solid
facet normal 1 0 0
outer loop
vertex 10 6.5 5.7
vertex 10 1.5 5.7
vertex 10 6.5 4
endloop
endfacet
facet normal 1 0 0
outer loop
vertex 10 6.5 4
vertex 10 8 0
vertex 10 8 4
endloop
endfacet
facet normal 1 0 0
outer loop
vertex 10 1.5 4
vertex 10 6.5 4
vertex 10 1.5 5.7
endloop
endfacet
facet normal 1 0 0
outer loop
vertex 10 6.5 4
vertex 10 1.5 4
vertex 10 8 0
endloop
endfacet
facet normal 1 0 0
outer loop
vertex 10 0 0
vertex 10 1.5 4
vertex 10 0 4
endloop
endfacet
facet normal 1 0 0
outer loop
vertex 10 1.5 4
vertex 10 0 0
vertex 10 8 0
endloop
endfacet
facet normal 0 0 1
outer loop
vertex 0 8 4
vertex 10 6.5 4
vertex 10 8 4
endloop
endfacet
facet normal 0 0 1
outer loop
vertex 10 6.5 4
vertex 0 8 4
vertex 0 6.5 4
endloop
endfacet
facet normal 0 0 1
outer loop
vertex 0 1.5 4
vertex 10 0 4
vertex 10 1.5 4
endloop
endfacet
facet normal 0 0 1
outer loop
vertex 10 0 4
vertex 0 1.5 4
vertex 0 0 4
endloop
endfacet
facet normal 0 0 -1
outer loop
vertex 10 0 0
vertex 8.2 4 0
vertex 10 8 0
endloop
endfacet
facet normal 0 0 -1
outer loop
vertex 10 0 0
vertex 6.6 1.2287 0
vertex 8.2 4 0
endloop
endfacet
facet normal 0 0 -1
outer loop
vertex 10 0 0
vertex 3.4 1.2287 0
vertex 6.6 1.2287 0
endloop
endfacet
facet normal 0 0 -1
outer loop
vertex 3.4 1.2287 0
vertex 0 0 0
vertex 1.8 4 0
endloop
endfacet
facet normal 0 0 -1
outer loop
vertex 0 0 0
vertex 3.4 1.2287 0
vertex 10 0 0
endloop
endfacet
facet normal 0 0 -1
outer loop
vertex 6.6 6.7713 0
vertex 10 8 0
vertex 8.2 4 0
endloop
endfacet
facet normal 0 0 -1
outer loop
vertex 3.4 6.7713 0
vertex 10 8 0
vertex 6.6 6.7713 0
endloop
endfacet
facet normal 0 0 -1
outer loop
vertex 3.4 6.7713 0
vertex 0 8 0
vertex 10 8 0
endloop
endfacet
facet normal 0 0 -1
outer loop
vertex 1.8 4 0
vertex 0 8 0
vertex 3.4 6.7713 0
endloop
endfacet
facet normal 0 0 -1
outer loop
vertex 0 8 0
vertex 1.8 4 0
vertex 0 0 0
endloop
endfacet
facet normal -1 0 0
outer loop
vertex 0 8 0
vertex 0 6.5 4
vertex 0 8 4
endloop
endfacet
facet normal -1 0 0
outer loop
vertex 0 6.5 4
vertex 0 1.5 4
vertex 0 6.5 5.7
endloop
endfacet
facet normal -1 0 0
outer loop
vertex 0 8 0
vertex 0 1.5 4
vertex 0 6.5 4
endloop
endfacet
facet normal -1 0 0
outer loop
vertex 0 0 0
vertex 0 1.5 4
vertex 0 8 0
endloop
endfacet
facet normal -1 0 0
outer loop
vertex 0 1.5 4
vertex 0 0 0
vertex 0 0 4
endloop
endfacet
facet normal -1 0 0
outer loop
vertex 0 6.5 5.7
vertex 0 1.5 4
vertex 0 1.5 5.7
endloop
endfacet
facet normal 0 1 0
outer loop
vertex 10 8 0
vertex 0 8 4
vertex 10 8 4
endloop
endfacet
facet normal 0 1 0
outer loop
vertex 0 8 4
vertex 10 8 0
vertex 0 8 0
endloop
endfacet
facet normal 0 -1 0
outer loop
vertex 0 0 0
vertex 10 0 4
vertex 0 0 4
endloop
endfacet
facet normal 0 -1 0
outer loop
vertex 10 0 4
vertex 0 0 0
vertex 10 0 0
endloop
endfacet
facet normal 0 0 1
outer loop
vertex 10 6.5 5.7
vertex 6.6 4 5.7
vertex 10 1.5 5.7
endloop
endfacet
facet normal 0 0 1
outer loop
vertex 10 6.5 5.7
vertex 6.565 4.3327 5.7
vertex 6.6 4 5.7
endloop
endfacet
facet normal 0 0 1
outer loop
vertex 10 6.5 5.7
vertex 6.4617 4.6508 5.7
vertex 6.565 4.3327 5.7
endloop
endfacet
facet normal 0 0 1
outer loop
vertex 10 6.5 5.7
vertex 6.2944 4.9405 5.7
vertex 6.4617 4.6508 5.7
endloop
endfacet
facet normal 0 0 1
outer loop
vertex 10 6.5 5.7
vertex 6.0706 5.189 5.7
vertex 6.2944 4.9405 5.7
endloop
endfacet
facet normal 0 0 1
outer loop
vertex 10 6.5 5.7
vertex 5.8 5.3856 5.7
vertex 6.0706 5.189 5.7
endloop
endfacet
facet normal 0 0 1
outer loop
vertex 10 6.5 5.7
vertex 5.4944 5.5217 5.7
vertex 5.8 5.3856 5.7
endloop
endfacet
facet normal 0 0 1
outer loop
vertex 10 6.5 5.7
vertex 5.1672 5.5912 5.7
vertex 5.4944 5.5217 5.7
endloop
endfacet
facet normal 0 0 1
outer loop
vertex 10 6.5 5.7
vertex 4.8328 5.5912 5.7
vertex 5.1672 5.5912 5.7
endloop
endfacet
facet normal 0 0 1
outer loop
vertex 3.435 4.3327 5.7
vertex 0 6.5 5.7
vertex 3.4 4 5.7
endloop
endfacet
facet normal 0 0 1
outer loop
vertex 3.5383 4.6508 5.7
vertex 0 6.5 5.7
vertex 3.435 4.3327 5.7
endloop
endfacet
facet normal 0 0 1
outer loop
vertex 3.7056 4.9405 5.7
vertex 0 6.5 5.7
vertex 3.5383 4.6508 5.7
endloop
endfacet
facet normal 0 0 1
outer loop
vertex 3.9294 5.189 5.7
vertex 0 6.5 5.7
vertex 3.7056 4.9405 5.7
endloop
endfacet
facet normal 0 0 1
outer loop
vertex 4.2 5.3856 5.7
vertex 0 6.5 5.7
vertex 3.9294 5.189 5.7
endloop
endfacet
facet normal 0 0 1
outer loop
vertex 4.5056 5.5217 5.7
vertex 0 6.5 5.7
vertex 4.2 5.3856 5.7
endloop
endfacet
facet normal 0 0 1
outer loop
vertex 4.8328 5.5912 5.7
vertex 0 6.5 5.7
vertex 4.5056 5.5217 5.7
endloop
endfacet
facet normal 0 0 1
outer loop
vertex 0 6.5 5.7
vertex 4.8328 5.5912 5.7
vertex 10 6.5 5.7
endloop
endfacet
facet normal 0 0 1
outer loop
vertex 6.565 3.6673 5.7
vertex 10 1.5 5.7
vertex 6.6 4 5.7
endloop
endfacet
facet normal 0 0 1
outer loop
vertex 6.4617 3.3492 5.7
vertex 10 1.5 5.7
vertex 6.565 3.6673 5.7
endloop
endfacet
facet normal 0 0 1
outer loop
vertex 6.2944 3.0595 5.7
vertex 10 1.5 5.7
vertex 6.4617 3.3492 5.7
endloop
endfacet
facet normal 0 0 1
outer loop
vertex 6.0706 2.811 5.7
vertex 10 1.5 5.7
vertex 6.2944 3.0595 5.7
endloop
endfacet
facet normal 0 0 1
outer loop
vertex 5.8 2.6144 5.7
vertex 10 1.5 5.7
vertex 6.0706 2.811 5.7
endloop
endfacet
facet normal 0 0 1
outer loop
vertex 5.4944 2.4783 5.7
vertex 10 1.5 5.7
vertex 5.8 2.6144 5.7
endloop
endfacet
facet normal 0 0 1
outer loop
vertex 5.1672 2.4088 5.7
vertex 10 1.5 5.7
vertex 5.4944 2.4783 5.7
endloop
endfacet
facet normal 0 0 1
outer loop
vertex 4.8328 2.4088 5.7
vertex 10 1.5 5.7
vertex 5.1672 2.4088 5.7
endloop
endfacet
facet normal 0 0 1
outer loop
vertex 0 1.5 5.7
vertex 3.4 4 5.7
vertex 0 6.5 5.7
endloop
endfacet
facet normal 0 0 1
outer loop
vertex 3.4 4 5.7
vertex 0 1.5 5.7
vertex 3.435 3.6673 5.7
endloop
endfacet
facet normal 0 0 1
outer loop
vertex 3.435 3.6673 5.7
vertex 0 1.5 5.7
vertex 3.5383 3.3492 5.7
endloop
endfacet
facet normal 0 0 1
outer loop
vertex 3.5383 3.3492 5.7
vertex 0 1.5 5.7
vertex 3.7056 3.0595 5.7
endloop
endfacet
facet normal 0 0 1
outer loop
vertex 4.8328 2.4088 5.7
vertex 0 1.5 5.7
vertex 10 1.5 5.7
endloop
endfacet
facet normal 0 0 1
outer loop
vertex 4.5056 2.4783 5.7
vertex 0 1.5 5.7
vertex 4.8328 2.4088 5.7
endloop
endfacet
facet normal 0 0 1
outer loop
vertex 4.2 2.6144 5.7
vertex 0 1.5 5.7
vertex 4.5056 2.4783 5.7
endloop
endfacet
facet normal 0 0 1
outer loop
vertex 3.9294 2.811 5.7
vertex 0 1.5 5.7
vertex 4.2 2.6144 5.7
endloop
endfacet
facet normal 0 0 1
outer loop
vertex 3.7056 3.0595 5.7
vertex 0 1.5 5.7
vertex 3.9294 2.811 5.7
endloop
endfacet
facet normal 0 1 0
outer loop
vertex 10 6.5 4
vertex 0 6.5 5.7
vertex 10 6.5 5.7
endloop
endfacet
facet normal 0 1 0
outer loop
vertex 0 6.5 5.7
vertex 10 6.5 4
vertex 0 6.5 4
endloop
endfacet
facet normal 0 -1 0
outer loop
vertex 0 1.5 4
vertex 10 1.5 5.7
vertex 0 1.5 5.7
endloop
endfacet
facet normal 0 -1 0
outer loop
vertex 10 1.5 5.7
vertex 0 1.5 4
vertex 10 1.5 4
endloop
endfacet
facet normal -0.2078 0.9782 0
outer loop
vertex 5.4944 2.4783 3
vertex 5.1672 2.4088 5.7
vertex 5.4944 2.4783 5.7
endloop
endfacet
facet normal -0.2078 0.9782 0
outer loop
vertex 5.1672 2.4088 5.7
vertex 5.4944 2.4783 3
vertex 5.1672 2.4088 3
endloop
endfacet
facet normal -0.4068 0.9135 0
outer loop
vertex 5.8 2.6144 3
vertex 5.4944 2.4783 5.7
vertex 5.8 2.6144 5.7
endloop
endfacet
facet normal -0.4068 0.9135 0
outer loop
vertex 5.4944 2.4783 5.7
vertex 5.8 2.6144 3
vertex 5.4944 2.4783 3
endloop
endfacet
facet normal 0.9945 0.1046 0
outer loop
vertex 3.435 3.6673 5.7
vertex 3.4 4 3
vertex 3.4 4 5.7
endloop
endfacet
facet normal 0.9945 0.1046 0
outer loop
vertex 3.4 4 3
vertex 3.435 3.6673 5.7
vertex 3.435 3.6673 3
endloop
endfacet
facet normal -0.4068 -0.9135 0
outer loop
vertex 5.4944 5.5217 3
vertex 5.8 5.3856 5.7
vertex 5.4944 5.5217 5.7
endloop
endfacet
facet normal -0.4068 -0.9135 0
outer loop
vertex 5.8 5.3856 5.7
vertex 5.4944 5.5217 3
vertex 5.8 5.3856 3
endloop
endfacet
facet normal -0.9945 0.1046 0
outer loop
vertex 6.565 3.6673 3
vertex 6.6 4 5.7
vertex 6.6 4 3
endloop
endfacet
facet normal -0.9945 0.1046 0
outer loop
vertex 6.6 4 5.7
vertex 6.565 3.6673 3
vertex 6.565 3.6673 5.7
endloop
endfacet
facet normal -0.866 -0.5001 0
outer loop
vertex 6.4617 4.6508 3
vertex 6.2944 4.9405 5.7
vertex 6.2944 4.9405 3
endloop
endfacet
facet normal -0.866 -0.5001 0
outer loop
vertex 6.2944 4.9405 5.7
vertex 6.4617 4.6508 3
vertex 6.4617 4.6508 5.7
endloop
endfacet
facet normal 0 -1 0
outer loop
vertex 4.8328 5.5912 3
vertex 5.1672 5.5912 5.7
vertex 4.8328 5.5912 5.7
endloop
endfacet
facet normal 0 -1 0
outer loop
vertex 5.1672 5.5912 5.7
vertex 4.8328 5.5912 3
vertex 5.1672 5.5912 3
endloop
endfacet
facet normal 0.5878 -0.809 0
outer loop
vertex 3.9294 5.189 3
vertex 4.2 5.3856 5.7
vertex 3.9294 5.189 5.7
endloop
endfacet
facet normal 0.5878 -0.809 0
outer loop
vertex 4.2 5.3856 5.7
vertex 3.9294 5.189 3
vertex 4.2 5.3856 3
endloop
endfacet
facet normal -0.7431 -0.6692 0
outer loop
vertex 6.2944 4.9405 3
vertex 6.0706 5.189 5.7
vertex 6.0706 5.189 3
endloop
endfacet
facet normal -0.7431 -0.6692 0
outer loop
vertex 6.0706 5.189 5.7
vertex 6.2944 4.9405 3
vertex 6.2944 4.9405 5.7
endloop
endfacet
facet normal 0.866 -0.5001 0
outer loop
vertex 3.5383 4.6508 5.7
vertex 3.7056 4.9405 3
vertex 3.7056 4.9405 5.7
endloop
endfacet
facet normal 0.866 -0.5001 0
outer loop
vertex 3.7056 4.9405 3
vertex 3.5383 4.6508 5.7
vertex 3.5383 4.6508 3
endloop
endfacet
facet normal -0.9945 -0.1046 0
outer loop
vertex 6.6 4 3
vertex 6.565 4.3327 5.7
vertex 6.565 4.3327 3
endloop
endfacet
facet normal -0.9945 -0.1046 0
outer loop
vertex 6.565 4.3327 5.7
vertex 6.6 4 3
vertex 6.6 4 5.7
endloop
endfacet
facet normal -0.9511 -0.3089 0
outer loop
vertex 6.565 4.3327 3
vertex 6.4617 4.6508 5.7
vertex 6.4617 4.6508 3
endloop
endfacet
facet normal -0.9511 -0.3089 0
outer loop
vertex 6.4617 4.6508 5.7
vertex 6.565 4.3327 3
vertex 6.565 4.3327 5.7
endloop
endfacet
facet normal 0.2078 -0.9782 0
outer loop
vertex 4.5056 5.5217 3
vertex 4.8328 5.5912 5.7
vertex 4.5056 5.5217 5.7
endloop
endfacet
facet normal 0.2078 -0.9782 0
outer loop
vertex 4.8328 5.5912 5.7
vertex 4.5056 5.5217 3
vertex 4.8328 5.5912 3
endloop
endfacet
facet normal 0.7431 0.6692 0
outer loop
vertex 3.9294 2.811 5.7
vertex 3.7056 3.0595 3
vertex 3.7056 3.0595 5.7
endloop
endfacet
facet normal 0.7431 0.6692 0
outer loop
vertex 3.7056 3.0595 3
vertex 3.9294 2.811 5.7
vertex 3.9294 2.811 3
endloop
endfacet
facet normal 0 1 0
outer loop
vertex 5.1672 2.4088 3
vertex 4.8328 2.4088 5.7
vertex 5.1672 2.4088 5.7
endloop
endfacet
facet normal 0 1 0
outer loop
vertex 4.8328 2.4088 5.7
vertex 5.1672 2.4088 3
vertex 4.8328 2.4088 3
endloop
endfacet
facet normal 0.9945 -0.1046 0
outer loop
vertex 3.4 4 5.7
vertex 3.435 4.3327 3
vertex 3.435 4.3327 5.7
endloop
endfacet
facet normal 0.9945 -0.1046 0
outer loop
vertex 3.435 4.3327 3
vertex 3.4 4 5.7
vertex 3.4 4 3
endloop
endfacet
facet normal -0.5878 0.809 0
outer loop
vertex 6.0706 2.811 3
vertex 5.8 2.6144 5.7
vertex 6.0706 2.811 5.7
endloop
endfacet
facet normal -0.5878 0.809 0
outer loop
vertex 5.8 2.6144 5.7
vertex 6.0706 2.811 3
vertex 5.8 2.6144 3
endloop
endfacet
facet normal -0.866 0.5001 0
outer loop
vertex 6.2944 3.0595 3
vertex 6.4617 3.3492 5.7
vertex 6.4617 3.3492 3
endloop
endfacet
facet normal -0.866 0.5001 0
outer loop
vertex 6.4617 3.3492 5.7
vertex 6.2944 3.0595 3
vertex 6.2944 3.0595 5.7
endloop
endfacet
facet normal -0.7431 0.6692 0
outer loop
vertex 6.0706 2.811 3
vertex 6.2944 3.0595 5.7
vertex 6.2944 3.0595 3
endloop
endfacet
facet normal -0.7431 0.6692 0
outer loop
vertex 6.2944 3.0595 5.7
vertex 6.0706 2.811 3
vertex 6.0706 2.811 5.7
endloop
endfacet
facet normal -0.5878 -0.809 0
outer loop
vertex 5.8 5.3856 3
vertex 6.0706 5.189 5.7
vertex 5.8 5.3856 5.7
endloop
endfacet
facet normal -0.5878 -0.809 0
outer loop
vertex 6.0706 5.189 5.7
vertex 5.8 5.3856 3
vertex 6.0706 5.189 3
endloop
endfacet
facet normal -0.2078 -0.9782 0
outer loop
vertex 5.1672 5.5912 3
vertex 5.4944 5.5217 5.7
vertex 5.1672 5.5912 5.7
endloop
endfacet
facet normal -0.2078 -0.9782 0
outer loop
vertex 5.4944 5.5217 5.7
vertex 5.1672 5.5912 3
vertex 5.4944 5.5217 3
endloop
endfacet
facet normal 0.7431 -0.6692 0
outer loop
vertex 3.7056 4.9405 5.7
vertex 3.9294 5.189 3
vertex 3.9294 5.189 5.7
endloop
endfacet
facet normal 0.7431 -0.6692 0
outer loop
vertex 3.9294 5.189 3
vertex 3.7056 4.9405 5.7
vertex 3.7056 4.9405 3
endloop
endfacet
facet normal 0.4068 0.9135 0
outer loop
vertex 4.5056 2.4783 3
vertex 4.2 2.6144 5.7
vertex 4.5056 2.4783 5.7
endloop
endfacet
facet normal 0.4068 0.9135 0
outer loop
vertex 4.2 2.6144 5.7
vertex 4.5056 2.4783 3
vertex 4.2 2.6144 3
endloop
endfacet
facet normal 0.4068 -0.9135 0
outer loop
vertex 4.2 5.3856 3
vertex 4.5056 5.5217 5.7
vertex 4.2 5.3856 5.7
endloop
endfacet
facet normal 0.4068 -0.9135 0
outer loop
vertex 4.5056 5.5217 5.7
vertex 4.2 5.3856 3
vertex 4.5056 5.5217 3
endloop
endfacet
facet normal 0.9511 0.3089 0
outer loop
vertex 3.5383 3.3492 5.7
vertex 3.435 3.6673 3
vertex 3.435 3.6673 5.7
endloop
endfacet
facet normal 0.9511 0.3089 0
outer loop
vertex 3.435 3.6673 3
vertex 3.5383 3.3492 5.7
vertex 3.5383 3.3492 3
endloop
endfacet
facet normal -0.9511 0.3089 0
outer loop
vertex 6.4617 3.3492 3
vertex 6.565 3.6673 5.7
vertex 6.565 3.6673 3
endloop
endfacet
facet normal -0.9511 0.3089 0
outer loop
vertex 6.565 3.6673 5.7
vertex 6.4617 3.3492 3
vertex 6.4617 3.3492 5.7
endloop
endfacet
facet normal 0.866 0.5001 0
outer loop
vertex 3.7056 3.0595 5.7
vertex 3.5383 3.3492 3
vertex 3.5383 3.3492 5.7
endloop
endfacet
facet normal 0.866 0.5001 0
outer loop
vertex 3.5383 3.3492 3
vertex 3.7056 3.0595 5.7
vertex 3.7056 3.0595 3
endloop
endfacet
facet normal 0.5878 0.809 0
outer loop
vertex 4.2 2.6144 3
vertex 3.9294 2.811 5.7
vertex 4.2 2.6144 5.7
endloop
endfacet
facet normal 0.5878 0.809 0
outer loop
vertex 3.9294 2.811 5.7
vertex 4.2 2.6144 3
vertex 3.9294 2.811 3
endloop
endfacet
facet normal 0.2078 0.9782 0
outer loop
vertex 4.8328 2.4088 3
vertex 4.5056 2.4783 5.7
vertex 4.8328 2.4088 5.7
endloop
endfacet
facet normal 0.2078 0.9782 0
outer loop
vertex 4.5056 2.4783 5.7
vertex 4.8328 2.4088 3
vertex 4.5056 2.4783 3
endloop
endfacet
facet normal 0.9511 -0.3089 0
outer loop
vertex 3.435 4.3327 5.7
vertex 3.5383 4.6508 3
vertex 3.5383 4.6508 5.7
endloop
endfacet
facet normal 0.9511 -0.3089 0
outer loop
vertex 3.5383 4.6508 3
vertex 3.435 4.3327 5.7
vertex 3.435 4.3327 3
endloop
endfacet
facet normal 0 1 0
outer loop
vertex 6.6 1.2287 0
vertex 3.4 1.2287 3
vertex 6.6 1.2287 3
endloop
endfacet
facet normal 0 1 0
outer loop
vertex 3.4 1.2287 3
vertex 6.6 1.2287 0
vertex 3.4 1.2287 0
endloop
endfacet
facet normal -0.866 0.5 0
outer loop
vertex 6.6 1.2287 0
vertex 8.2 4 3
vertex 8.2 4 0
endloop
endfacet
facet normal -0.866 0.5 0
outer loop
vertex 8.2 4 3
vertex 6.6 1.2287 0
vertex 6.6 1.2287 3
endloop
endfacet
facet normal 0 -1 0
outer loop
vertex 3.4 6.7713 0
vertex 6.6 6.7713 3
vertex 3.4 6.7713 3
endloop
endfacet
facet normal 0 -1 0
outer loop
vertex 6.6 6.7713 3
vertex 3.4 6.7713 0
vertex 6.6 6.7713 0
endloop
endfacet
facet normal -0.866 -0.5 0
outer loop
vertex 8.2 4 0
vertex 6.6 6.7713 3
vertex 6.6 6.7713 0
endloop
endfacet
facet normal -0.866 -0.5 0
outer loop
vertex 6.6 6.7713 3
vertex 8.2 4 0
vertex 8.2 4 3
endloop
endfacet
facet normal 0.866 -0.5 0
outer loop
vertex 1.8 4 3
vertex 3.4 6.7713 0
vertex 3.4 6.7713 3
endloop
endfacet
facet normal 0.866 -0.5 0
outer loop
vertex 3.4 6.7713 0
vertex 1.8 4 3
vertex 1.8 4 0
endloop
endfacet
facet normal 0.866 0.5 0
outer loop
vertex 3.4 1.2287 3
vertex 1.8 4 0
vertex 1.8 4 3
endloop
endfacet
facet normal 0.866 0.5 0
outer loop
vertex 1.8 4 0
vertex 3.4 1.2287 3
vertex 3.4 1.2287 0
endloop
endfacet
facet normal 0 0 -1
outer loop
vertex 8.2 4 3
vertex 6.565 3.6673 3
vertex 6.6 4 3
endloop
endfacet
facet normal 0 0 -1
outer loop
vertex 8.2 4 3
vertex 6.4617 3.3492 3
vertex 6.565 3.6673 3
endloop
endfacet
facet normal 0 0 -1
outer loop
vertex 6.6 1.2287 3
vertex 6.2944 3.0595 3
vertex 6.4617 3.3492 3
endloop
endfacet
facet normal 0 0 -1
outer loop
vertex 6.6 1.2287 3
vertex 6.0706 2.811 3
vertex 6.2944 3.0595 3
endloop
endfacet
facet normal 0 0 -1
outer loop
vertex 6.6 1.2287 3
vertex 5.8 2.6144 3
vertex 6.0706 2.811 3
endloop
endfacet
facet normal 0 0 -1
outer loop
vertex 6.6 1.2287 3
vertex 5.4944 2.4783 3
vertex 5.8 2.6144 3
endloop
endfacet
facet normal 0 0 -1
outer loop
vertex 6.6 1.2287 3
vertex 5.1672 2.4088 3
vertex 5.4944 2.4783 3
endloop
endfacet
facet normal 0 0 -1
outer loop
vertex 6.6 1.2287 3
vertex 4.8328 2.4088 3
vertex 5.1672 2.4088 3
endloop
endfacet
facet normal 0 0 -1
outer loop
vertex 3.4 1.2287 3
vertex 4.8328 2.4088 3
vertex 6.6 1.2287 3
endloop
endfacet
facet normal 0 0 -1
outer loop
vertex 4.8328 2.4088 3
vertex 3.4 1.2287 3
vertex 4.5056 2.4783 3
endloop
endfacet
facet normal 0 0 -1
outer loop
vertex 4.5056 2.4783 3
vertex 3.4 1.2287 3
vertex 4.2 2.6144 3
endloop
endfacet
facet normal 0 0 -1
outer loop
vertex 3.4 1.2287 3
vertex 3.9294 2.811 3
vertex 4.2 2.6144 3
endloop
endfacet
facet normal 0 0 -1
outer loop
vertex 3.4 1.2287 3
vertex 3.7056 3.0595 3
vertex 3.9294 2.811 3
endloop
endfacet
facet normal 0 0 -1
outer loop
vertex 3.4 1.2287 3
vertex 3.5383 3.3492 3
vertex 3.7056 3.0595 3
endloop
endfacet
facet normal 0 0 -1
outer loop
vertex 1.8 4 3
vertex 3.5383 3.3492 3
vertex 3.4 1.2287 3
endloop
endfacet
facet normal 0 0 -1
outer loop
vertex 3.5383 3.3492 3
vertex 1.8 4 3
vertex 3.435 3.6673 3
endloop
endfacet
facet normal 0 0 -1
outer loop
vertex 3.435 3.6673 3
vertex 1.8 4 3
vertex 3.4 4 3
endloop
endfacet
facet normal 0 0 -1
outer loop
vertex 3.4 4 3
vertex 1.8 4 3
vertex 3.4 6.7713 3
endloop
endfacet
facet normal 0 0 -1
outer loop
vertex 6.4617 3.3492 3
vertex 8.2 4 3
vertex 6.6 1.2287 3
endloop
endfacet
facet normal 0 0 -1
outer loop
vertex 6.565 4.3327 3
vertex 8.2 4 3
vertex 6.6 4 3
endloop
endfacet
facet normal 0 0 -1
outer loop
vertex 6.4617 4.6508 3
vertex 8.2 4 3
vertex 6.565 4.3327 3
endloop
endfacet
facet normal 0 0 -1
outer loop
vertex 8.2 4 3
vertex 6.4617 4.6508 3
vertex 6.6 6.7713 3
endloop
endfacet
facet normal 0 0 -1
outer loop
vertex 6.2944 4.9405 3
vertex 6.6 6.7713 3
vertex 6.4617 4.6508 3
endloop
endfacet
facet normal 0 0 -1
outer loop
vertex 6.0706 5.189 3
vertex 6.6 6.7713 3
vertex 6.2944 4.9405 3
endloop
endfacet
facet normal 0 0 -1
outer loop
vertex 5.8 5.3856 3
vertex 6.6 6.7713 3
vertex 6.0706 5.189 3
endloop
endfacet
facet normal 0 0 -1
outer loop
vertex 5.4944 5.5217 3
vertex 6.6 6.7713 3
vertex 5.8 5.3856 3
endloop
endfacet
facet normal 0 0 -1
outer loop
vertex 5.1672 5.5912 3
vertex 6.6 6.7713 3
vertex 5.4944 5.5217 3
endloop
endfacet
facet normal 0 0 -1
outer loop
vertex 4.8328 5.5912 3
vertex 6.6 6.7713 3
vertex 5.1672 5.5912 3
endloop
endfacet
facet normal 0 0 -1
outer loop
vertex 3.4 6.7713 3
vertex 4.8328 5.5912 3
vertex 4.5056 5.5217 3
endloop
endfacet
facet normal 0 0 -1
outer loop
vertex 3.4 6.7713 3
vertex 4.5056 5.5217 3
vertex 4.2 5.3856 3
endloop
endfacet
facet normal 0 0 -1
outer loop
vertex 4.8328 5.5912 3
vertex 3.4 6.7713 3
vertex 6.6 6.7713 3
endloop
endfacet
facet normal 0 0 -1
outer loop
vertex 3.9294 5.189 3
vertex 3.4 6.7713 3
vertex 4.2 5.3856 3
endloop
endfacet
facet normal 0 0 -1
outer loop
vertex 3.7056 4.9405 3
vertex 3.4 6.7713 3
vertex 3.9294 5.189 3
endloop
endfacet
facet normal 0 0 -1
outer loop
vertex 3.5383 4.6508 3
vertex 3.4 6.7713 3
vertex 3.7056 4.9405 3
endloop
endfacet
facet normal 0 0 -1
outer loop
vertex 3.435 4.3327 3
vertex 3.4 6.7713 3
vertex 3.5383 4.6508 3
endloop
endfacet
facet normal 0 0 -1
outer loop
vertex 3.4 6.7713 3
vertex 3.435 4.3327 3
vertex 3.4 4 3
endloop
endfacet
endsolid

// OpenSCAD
// Clip de fijacion en el interior de perfiles de alumino.
// Released under the terms of GNU/GPL v3.0 or higher
// (Copyleft) Isidoro Gayo Velez
// Feb 2015

color("pink")difference(){
	union(){
		cube([10,8,4]);
		translate([0,1.5,4])cube([10,5,1.7]);
	}
	
	translate([5,4,-2])union(){
		cylinder(h=20,r=1.6,$fn=30);
		cylinder(h=5,r=3.2,$fn=6);
	}
}
